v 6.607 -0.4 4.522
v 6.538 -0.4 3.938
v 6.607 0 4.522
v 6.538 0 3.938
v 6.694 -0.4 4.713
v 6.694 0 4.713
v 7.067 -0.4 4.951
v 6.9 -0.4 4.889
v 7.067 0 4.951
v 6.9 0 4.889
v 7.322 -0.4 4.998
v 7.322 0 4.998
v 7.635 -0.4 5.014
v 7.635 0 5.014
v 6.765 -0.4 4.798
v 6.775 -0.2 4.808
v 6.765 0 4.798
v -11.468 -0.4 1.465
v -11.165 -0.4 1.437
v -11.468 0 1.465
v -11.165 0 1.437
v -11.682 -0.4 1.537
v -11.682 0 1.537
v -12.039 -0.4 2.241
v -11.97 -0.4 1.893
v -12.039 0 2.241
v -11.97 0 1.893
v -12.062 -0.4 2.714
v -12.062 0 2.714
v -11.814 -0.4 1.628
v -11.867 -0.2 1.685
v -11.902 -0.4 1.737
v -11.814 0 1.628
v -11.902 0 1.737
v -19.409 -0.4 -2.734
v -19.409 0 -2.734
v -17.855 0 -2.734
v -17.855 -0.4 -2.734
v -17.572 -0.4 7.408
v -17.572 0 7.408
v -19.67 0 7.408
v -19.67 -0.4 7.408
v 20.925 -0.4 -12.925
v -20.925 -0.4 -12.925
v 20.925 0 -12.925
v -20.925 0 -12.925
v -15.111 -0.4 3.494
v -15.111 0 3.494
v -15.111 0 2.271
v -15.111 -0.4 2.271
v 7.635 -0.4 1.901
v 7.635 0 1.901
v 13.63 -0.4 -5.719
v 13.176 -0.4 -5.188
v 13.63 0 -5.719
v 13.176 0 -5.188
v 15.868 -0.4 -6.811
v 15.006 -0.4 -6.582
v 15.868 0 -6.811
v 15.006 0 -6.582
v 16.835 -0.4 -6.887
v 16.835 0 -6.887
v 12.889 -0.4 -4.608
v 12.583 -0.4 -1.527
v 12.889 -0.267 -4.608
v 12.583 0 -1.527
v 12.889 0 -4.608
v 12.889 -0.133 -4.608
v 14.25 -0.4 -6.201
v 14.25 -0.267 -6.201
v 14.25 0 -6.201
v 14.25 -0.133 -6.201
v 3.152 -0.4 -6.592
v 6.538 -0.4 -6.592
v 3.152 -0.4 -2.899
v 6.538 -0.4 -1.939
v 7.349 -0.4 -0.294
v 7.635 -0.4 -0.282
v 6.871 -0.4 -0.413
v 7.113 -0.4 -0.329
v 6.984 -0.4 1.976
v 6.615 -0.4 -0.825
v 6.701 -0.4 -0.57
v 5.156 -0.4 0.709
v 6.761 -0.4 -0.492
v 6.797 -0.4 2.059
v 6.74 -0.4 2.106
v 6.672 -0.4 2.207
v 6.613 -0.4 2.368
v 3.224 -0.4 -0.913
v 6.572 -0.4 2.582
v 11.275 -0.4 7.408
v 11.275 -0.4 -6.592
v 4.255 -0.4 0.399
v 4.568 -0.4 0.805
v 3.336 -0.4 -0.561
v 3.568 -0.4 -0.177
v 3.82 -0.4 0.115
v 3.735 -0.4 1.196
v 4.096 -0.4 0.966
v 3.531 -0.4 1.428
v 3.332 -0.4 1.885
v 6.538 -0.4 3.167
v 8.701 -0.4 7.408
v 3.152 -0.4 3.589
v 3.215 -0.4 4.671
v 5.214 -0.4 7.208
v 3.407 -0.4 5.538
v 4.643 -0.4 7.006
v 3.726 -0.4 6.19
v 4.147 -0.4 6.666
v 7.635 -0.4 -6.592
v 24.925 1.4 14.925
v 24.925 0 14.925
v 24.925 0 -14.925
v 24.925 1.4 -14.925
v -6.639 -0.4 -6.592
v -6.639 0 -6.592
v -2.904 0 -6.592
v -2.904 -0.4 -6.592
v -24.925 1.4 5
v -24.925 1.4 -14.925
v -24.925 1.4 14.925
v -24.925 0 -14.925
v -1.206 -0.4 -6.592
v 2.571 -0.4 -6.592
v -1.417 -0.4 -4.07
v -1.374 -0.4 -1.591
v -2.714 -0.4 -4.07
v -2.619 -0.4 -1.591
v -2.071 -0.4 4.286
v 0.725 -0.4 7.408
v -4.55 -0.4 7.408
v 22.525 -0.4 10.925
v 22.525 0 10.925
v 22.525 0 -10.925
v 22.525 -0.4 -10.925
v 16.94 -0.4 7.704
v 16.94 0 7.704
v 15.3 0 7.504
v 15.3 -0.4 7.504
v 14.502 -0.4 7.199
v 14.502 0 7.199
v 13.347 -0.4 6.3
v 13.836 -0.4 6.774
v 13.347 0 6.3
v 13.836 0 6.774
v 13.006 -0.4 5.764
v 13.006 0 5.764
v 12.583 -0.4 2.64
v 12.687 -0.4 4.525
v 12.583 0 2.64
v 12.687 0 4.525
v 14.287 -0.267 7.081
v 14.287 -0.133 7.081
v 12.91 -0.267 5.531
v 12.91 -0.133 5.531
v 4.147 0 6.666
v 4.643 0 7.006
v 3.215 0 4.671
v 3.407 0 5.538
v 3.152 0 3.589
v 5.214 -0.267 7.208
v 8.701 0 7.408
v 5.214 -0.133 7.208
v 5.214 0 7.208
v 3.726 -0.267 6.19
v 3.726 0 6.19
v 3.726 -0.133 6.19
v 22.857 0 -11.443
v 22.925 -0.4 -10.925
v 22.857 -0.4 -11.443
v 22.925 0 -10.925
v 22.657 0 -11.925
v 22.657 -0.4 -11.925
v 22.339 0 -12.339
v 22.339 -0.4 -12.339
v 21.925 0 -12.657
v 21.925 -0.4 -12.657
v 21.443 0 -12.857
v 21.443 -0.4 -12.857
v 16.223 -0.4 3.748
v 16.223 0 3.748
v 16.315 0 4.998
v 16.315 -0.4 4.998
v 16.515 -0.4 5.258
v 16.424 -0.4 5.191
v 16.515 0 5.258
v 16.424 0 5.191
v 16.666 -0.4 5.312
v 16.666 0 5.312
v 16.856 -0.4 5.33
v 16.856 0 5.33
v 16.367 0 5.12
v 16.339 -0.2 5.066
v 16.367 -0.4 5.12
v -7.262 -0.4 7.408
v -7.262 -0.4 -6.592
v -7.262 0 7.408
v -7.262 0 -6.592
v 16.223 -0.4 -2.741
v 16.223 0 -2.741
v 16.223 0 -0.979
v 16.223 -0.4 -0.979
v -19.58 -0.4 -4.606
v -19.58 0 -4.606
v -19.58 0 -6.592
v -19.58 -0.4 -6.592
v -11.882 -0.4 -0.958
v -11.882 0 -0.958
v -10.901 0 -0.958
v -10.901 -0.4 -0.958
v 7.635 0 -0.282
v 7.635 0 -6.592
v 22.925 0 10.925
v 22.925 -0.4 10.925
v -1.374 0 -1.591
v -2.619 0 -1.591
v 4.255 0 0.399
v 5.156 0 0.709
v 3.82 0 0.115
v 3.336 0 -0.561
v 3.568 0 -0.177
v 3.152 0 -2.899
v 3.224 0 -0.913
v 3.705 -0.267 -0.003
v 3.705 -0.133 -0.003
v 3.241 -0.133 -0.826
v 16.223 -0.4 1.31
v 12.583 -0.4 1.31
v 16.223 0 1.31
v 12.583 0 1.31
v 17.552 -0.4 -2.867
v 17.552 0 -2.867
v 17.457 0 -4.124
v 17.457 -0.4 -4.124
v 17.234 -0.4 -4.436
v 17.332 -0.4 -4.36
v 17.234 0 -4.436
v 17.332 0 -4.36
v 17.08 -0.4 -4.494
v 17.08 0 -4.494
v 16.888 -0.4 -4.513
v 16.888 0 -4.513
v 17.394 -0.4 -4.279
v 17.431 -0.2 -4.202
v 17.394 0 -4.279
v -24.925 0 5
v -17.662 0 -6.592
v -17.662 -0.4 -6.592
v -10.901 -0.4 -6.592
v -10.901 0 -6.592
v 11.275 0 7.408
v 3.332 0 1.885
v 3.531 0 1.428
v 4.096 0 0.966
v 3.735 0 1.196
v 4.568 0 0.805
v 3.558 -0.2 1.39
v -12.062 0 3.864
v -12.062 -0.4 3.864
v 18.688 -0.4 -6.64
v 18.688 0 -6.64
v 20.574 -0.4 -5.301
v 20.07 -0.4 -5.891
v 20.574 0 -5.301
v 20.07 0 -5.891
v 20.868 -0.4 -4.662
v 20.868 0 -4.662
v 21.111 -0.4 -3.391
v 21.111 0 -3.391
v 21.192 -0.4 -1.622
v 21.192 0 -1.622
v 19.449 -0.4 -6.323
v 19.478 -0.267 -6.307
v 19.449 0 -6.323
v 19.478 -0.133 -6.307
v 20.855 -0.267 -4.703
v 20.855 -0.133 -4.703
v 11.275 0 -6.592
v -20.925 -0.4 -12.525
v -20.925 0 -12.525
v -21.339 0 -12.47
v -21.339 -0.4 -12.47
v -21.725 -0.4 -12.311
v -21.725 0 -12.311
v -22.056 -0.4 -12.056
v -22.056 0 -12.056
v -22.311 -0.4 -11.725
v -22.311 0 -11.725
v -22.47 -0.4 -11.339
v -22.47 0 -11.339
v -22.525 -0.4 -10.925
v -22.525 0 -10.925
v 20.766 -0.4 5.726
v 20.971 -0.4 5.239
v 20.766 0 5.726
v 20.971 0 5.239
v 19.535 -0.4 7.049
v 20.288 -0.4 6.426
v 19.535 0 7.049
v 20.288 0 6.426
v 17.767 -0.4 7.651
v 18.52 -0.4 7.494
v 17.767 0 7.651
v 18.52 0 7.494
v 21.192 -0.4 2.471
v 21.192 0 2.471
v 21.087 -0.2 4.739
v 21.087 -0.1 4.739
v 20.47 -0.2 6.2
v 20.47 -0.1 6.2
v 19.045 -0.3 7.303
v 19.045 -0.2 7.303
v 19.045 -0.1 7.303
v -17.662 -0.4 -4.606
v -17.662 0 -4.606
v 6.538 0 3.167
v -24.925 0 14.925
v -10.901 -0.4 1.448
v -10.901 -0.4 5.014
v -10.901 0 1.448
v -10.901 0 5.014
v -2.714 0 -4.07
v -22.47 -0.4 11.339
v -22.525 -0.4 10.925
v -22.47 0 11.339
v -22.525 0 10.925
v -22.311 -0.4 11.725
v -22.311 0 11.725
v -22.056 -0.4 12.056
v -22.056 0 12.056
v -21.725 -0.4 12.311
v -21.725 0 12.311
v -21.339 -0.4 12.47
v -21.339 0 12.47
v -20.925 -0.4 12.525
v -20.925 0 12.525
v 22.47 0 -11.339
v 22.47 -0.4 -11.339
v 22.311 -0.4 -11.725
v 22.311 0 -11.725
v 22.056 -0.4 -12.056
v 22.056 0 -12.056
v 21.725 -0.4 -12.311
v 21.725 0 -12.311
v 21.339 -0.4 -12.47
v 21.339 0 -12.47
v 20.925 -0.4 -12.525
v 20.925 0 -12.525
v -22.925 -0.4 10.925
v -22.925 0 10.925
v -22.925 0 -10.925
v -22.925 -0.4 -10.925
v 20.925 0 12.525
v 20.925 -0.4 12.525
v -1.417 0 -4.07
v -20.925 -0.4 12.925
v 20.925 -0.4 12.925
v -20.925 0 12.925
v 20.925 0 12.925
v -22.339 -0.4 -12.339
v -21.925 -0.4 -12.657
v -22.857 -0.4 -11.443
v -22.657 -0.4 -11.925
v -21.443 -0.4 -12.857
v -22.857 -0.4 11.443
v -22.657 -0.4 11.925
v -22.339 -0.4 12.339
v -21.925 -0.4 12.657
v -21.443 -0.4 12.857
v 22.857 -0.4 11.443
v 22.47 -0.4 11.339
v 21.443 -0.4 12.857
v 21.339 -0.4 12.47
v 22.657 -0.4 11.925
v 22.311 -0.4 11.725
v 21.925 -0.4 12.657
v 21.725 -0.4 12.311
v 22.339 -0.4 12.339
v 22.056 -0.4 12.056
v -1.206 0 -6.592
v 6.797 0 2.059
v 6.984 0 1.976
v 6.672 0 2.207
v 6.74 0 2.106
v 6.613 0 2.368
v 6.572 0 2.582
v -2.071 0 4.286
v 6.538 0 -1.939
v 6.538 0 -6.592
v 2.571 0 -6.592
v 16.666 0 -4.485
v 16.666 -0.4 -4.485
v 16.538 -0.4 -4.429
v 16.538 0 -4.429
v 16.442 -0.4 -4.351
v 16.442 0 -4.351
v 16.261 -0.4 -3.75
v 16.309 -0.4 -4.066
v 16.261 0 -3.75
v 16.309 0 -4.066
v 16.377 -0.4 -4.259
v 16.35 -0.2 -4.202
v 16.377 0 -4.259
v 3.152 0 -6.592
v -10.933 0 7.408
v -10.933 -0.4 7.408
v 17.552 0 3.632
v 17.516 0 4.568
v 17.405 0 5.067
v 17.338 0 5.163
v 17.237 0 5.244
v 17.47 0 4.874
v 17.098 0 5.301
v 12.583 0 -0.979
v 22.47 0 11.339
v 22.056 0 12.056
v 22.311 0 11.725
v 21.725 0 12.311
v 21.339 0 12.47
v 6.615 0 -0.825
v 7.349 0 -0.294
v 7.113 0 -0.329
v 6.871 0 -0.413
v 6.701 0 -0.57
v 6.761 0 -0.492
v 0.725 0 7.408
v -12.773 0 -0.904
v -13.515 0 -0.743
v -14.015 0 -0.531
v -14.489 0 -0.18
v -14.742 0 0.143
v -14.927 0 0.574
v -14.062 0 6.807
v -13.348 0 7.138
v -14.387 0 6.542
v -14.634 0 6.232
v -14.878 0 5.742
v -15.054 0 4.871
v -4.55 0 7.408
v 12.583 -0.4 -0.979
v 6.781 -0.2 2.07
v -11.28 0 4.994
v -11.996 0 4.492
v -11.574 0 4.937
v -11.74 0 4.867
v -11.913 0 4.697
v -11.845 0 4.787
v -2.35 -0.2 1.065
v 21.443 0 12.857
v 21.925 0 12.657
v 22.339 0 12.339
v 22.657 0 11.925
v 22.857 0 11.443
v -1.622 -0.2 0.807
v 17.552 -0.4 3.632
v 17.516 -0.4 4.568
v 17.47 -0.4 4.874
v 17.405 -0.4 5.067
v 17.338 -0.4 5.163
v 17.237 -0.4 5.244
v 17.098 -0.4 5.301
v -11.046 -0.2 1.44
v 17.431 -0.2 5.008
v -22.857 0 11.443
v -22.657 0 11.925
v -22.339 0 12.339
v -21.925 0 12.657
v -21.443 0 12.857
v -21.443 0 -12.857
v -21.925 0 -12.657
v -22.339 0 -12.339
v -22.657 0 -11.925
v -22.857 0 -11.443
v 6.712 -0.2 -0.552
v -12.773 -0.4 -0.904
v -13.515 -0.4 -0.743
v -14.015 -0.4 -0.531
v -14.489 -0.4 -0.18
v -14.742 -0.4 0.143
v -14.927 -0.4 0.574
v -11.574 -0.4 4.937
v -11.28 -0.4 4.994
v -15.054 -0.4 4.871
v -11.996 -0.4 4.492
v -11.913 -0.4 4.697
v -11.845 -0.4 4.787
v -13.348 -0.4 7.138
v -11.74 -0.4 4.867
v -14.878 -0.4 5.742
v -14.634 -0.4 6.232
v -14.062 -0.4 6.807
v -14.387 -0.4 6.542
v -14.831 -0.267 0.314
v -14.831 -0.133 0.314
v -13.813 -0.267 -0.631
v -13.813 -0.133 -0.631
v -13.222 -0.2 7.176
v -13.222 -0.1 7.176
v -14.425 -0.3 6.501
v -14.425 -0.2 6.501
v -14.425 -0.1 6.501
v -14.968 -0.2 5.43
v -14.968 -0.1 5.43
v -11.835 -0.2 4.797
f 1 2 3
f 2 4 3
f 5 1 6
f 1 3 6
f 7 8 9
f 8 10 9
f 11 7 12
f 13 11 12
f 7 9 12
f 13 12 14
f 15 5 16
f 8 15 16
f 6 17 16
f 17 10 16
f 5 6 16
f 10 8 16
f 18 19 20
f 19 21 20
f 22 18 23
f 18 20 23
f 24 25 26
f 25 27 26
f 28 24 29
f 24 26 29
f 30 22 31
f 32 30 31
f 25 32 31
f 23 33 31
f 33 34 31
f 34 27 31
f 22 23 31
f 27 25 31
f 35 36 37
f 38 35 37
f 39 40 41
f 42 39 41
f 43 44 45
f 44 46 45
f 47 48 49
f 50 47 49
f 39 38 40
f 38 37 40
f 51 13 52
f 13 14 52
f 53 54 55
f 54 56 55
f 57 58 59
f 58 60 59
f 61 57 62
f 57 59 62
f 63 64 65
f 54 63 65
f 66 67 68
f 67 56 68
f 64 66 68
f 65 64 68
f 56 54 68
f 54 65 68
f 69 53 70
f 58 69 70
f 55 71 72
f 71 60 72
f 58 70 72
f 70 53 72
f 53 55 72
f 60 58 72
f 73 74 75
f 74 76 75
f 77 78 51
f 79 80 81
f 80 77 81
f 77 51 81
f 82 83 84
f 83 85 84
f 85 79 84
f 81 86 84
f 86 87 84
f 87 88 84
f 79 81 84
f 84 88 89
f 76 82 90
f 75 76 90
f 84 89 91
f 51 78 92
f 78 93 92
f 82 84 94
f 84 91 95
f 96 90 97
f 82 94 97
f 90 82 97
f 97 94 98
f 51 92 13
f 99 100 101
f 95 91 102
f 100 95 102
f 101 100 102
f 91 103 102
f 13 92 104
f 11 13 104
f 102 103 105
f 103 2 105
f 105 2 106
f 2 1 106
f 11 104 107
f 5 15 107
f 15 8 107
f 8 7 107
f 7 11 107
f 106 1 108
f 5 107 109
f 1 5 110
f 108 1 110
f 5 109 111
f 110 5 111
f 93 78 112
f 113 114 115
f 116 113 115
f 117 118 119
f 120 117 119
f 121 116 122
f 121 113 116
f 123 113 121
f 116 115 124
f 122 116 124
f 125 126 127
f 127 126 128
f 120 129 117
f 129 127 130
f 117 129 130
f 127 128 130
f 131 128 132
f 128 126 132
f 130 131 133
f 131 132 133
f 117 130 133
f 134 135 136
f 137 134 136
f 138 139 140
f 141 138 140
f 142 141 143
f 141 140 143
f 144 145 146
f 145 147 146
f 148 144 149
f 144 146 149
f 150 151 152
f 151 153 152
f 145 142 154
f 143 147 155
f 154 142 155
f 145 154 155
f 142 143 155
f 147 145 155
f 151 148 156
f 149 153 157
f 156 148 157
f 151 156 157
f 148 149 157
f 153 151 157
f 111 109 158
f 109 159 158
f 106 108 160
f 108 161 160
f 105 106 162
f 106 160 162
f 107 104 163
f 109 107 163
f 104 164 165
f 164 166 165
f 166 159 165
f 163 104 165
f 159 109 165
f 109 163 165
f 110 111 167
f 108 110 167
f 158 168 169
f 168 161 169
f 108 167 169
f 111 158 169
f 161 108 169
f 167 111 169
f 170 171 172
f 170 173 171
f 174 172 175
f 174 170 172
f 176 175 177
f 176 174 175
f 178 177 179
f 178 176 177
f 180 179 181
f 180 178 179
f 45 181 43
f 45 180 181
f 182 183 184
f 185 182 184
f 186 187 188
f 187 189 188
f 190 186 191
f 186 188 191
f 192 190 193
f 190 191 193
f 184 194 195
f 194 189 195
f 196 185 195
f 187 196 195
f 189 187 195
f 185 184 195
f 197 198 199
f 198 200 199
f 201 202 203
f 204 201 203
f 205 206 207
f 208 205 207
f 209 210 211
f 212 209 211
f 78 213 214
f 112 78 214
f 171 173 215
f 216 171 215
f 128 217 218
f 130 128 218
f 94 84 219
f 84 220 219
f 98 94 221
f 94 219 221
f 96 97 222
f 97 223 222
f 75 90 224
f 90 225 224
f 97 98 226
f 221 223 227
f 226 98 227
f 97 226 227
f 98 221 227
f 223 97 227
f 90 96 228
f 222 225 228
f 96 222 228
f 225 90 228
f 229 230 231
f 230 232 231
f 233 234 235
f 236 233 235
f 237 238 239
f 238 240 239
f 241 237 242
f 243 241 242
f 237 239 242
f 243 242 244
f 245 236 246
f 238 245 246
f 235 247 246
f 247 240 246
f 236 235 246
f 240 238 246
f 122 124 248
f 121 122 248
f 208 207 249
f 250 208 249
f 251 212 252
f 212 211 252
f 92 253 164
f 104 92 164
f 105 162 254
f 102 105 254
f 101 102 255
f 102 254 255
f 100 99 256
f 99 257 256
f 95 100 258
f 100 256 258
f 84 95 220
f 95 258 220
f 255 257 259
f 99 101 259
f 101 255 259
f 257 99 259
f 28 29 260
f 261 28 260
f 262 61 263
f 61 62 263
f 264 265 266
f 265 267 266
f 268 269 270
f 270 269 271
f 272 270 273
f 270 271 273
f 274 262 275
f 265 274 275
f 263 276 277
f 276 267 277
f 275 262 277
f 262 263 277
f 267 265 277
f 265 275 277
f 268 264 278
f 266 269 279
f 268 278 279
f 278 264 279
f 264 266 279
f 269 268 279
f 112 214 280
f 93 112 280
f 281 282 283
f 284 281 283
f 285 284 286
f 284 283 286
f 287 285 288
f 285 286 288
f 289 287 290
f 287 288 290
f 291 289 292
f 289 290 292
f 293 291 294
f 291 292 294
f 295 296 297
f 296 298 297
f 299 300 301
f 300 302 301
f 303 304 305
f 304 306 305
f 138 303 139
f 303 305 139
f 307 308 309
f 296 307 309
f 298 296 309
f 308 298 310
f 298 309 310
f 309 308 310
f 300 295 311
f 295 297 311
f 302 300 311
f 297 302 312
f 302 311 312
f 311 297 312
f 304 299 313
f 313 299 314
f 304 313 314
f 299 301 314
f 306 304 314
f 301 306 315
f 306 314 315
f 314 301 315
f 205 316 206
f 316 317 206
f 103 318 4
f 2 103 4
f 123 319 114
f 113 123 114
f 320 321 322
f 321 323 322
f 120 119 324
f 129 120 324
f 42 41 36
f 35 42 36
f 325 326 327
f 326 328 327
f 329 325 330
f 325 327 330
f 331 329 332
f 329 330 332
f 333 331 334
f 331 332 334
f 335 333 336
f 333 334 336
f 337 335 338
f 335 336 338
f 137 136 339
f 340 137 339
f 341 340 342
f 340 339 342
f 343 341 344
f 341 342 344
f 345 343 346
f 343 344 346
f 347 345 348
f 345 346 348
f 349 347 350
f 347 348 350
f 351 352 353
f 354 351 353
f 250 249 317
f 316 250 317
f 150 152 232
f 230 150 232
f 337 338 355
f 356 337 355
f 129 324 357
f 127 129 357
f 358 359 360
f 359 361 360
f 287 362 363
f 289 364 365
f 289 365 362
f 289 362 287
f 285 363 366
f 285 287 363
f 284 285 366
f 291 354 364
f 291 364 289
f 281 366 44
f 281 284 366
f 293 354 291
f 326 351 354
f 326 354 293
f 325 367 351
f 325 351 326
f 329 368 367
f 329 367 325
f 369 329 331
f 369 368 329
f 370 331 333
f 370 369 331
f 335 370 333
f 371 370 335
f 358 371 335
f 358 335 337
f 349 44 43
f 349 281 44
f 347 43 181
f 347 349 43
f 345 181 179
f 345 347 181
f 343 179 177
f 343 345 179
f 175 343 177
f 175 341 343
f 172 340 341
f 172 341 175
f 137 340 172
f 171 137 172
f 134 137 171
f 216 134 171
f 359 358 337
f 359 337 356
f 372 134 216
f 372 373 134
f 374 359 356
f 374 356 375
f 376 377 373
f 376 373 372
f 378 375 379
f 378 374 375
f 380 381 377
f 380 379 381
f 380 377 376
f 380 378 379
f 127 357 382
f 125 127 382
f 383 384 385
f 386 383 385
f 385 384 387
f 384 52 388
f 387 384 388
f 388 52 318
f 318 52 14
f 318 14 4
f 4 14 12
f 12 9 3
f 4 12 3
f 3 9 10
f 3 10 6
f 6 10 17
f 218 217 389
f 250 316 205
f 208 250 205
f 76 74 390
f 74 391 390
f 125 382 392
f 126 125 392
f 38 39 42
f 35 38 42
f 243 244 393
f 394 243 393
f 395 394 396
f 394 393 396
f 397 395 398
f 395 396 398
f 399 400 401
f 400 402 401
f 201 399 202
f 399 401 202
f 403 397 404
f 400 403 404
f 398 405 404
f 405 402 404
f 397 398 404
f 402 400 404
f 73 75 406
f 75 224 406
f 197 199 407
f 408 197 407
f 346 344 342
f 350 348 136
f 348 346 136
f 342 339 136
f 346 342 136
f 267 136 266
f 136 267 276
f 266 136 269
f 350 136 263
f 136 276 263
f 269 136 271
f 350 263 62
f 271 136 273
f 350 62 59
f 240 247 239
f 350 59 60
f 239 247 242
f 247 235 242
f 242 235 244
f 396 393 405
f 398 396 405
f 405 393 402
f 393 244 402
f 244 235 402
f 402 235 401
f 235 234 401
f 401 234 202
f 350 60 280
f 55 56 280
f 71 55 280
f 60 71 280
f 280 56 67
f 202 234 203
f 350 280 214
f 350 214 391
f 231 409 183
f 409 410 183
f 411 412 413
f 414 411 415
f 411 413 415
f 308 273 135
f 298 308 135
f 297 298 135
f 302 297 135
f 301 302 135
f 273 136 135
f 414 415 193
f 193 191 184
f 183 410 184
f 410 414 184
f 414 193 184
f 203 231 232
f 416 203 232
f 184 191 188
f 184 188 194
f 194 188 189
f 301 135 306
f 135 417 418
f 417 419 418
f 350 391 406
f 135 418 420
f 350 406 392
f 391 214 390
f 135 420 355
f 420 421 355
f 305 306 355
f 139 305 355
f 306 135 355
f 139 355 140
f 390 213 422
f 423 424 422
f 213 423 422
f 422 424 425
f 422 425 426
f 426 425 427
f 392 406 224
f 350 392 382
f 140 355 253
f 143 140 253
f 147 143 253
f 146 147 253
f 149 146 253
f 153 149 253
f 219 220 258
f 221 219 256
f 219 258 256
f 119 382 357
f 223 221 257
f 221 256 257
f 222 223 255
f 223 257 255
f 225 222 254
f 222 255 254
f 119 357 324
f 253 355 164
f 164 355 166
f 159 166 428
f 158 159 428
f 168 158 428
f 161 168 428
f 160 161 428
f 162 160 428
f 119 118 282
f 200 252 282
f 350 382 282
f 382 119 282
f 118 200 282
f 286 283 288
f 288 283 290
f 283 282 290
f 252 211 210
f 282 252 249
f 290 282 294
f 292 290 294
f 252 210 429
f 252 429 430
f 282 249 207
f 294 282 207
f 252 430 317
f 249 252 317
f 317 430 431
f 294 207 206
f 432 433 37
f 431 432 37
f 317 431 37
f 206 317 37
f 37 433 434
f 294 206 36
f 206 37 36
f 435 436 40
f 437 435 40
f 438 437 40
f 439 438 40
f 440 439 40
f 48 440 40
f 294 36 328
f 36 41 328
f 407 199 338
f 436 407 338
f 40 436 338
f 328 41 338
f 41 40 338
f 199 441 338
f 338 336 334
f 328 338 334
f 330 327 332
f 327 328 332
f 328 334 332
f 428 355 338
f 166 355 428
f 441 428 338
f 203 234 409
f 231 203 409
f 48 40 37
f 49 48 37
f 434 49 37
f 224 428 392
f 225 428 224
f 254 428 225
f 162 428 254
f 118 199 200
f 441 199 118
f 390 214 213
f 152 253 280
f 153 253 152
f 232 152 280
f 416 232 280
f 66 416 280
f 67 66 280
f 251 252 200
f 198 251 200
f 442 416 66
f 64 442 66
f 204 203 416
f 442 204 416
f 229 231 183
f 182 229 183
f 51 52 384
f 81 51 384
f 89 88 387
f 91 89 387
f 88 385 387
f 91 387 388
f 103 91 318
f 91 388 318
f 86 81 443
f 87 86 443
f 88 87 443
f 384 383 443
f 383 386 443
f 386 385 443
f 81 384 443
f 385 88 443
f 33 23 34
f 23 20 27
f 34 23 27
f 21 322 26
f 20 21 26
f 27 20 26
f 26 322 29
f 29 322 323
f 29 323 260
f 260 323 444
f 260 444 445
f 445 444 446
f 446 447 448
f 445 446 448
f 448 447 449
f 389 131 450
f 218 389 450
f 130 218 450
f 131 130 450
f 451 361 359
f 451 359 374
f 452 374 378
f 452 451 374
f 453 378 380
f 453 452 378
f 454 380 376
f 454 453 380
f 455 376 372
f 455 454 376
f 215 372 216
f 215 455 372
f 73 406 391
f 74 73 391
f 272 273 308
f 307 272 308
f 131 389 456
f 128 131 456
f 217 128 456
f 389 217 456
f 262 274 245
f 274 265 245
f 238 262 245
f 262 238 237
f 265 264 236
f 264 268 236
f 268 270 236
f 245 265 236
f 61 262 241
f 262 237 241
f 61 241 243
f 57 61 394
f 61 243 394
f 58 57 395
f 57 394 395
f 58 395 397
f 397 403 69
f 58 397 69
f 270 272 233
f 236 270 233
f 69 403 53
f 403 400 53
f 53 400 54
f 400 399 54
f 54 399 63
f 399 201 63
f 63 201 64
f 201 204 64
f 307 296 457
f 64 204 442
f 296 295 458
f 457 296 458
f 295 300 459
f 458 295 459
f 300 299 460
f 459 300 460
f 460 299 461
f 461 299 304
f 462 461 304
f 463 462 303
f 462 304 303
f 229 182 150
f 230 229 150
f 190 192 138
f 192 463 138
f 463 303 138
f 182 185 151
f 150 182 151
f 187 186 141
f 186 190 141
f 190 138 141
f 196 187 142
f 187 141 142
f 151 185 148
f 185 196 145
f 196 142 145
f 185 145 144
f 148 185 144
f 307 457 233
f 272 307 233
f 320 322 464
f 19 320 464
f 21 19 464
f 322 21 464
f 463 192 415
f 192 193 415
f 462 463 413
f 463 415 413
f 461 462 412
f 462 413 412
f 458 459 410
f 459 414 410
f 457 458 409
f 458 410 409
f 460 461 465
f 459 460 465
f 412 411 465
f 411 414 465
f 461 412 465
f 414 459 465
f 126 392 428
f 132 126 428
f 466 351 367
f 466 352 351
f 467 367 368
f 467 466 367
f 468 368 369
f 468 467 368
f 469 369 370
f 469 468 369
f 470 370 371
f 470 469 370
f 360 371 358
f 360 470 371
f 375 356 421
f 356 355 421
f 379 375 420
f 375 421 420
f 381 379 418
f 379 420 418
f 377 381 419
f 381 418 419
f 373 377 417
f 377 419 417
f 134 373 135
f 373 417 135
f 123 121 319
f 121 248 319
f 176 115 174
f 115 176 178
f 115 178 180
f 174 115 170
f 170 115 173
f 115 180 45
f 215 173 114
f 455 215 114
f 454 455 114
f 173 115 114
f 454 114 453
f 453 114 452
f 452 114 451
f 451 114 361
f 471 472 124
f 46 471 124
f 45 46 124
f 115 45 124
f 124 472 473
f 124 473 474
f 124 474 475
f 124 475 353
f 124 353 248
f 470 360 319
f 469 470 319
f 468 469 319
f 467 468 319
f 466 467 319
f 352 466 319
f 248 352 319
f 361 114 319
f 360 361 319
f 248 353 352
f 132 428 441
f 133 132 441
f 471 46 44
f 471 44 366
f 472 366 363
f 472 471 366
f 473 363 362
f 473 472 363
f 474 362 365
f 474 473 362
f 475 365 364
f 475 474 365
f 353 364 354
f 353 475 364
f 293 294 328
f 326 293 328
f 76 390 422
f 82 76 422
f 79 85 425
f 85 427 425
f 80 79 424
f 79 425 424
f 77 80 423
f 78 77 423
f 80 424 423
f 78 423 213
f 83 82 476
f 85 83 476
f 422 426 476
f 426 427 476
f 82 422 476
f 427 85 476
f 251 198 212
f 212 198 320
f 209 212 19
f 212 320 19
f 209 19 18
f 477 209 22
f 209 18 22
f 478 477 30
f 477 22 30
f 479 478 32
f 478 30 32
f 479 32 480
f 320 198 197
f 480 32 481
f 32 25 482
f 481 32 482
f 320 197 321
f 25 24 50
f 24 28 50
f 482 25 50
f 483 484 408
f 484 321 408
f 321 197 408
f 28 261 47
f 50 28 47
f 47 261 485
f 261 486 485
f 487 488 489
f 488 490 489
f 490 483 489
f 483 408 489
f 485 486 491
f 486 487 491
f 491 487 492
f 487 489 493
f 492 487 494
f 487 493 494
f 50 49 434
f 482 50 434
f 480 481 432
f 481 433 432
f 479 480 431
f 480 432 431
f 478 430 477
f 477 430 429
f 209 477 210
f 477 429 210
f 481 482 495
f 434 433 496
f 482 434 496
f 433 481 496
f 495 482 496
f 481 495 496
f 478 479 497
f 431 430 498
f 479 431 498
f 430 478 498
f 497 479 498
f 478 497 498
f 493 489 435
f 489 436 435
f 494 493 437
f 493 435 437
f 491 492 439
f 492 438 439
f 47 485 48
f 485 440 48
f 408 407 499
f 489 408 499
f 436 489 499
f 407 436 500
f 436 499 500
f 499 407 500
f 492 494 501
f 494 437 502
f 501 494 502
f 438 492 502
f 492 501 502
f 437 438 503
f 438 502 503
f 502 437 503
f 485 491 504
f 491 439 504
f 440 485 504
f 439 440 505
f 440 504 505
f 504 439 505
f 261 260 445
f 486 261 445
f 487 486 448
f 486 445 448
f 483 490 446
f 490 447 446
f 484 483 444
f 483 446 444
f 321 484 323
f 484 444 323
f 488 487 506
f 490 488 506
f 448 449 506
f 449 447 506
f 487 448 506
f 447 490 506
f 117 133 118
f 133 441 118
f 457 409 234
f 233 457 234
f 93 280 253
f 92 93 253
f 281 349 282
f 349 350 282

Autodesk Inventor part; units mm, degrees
ref_plane "YZ Plane" through (0, 0, 0) normal (1, 0, 0) x (0, 1, 0)
ref_plane "XZ Plane" through (0, 0, 0) normal (0, 1, 0) x (-1, 0, 0)
ref_plane "XY Plane" through (0, 0, 0) normal (0, 0, 1) x (1, 0, 0)
sketch "Sketch1" plane through (0, 0, 0) normal (0, 1, 0) x (-1, 0, 0)
  line L0 (24.925, 14.925) -> (-24.925, 14.925)
  line L1 (-24.925, 14.925) -> (-24.925, -14.925)
  line L2 (-24.925, -14.925) -> (24.925, -14.925)
  line L3 (24.925, 14.925) -> (-24.925, -14.925) construction
  line L4 (-24.925, 14.925) -> (24.925, -14.925) construction
  line L5 (24.925, -14.925) -> (24.925, 14.925)
  line L6 (24.925, 5) -> (24.925, 14.925)
  point P0 (0, 0)
  dimension "d0" = 49.85
  dimension "d1" = 29.85
extrude "Extrusion1" add sketch "Sketch1" along normal blind 1.4
sketch "Sketch2" plane through (0, 0, 0) normal (0, -1, 0) x (1, 0, 0)
  point P0 (0, 0)
sketch "Sketch3" plane through (-24.925, 0, -14.925) normal (-1, 0, 0) x (0, 0, 1)
  point P0 (14.925, 0)
ref_plane "Work Plane1" through (0, 0, 0) normal (0, 1, 0) x (-1, 0, 0)
sketch "Sketch5" plane through (0, 0, 0) normal (0, 1, 0) x (-1, 0, 0)
  line L0 (-24.925, 14.925) -> (24.925, 14.925) projected
  line L1 (24.925, -14.925) -> (-24.925, -14.925) projected
  line L2 (24.925, 14.925) -> (24.925, -14.925) projected
  line L3 (-19.3821, 7.7039) -> (19.3821, 7.7039) construction
  line L4 (19.3821, 7.7039) -> (19.3821, -7.7039) construction
  line L5 (19.3821, -7.7039) -> (-19.3821, -7.7039) construction
  line L6 (-19.3821, -7.7039) -> (-19.3821, 7.7039) construction
  line L7 (-24.925, -14.925) -> (-24.925, 14.925) projected
  line L8 (-12.5833, 1.3105) -> (-16.2231, 1.3105)
  line L9 (-16.2231, 1.3105) -> (-16.2231, 3.7476)
  spline S0 degree 2 poles (-16.2231, 3.7476) (-16.2231, 4.8026) (-16.4552, 5.3301) (-16.8561, 5.3301) knots 0 0 0 1 2 2 2
  spline S1 degree 2 poles (-16.8561, 5.3301) (-17.3097, 5.3301) (-17.5524, 4.6866) (-17.5524, 3.6316) knots 0 0 0 1 2 2 2
  line L10 (-17.5524, 3.6316) -> (-17.5524, -2.8673)
  spline S2 degree 2 poles (-17.5524, -2.8673) (-17.5524, -3.8907) (-17.3097, -4.5131) (-16.8877, -4.5131) knots 0 0 0 1 2 2 2
  spline S3 degree 2 poles (-16.8877, -4.5131) (-16.4763, -4.5131) (-16.2231, -3.8907) (-16.2231, -2.7407) knots 0 0 0 1 2 2 2
  line L11 (-16.2231, -2.7407) -> (-16.2231, -0.9788)
  line L12 (-16.2231, -0.9788) -> (-12.5833, -0.9788)
  line L13 (-12.5833, -0.9788) -> (-12.5833, -1.5274)
  spline S4 degree 2 poles (-12.5833, -1.5274) (-12.5833, -3.7008) (-13.1952, -5.5154) (-15.3052, -6.8869) (-16.835, -6.8869) knots 0 0 0 1 2 3 3 3
  spline S5 degree 2 poles (-16.835, -6.8869) (-18.4386, -6.8869) (-20.517, -5.7264) (-21.1922, -3.6797) (-21.1922, -1.6224) knots 0 0 0 1 2 3 3 3
  line L14 (-21.1922, -1.6224) -> (-21.1922, 2.4711)
  spline S6 degree 2 poles (-21.1922, 2.4711) (-21.1922, 3.9797) (-20.9812, 5.4989) (-19.9578, 6.9021) (-18.1326, 7.7039) (-16.9405, 7.7039) knots 0 0 0 1 2 3 4 4 4
  spline S7 degree 2 poles (-16.9405, 7.7039) (-15.3369, 7.7039) (-13.2374, 6.459) (-12.5833, 4.6022) (-12.5833, 2.6399) knots 0 0 0 1 2 3 3 3
  line L15 (-12.5833, 2.6399) -> (-12.5833, 1.3105)
  line L16 (-11.2751, 7.4085) -> (-8.7008, 7.4085)
  spline S8 degree 2 poles (-8.7008, 7.4085) (-6.1266, 7.4085) (-4.3014, 7.0076) (-3.1515, 5.3723) (-3.1515, 3.5894) knots 0 0 0 1 2 3 3 3
  spline S9 degree 2 poles (-3.1515, 3.5894) (-3.1515, 1.9541) (-3.9638, 0.8252) (-5.156, 0.7092) knots 0 0 0 1 2 2 2
  spline S10 degree 2 poles (-5.156, 0.7092) (-4.0799, 0.4454) (-3.3308, -0.4513) (-3.1515, -1.2004) (-3.1515, -2.899) knots 0 0 0 1 2 3 3 3
  line L17 (-3.1515, -2.899) -> (-3.1515, -6.5915)
  line L18 (-3.1515, -6.5915) -> (-6.5381, -6.5915)
  line L19 (-6.5381, -6.5915) -> (-6.5381, -1.9389)
  spline S11 degree 2 poles (-6.5381, -1.9389) (-6.5381, -0.8206) (-6.8862, -0.2825) (-7.6353, -0.2825) knots 0 0 0 1 2 2 2
  line L20 (-7.6353, -0.2825) -> (-7.6353, -6.5915)
  line L21 (-7.6353, -6.5915) -> (-11.2751, -6.5915)
  line L22 (-11.2751, -6.5915) -> (-11.2751, 7.4085)
  line L23 (-7.6353, 5.0136) -> (-7.6353, 1.9013)
  spline S12 degree 2 poles (-7.6353, 1.9013) (-7.0234, 1.9013) (-6.5381, 2.239) (-6.5381, 3.1674) knots 0 0 0 1 2 2 2
  line L24 (-6.5381, 3.1674) -> (-6.5381, 3.9375)
  spline S13 degree 2 poles (-6.5381, 3.9375) (-6.5381, 4.6022) (-7.0128, 5.0136) (-7.6353, 5.0136) knots 0 0 0 1 2 2 2
  line L25 (4.5501, 7.4085) -> (6.639, -6.5915)
  line L26 (6.639, -6.5915) -> (2.9043, -6.5915)
  line L27 (2.9043, -6.5915) -> (2.7144, -4.07)
  line L28 (2.7144, -4.07) -> (1.4167, -4.07)
  line L29 (1.4167, -4.07) -> (1.2057, -6.5915)
  line L30 (1.2057, -6.5915) -> (-2.5712, -6.5915)
  line L31 (-2.5712, -6.5915) -> (-0.725, 7.4085)
  line L32 (-0.725, 7.4085) -> (4.5501, 7.4085)
  spline S14 degree 2 poles (2.6194, -1.5907) (2.3557, 0.783) (2.0708, 4.2857) knots 0 0 0 1 1 1
  spline S15 degree 2 poles (2.0708, 4.2857) (1.5222, 0.2661) (1.3745, -1.5907) knots 0 0 0 1 1 1
  line L33 (1.3745, -1.5907) -> (2.6194, -1.5907)
  line L34 (7.2615, 7.4085) -> (10.9329, 7.4085)
  spline S16 degree 2 poles (10.9329, 7.4085) (12.4205, 7.4085) (14.0241, 6.9443) (14.8259, 6.0581) (15.1108, 4.8026) (15.1108, 3.4944) knots 0 0 0 1 2 3 4 4 4
  line L35 (15.1108, 3.4944) -> (15.1108, 2.2706)
  spline S17 degree 2 poles (15.1108, 2.2706) (15.1108, 0.9307) (14.5516, -0.3036) (13.0746, -0.9577) (11.8824, -0.9577) knots 0 0 0 1 2 3 3 3
  line L36 (11.8824, -0.9577) -> (10.9013, -0.9577)
  line L37 (10.9013, -0.9577) -> (10.9013, -6.5915)
  line L38 (10.9013, -6.5915) -> (7.2615, -6.5915)
  line L39 (7.2615, -6.5915) -> (7.2615, 7.4085)
  line L40 (10.9013, 5.0136) -> (10.9013, 1.4477)
  spline S18 degree 2 poles (10.9013, 1.4477) (11.0595, 1.4371) (11.165, 1.4371) knots 0 0 0 1 1 1
  spline S19 degree 2 poles (11.165, 1.4371) (11.6714, 1.4371) (12.0618, 1.933) (12.0618, 2.7137) knots 0 0 0 1 2 2 2
  line L41 (12.0618, 2.7137) -> (12.0618, 3.8637)
  spline S20 degree 2 poles (12.0618, 3.8637) (12.0618, 4.5811) (11.6081, 5.0136) (10.9013, 5.0136) knots 0 0 0 1 2 2 2
  line L42 (19.6704, 7.4085) -> (19.4094, -2.7341)
  line L43 (19.4094, -2.7341) -> (17.8551, -2.7341)
  line L44 (17.8551, -2.7341) -> (17.5715, 7.4085)
  line L45 (17.5715, 7.4085) -> (19.6704, 7.4085)
  line L46 (19.5796, -6.5915) -> (17.6623, -6.5915)
  line L47 (17.6623, -6.5915) -> (17.6623, -4.6061)
  line L48 (17.6623, -4.6061) -> (19.5796, -4.6061)
  line L49 (19.5796, -4.6061) -> (19.5796, -6.5915)
  point P0 (0, 0)
  dimension "d13" = 29.85
  dimension "d14" = 49.85
  dimension "d16" = 38.7641
  dimension "d17" = 15.4078
  dimension "d18" = 7.2211
  dimension "d22" = 5.5429
extrude "Extrusion4" add sketch "Sketch5" against normal blind 0.4 contours L8 L9 S0 S1 L10 S2 S3 L11 L12 L13 S4 S5 L14 S6 S7 L15 | L16 S8 S9 S10 L17 L18 L19 S11 L20 L21 L22 | L25 L26 L27 L28 L29 L30 L31 L32 | L34 S16 L35 S17 L36 L37 L38 L39 | L42 L43 L44 L45 | L46 L47 L48 L49
sketch "Sketch6" plane through (0, 0, 0) normal (0, -1, 0) x (1, 0, 0)
  line L0 (-24.925, 14.925) -> (-24.925, -14.925) projected
  line L1 (24.925, 14.925) -> (-24.925, 14.925) projected
  line L2 (24.925, -14.925) -> (24.925, 14.925) projected
  line L3 (-24.925, -14.925) -> (24.925, -14.925) projected
  line L4 (-22.925, 10.925) -> (-22.925, -10.925)
  line L5 (-20.925, -12.925) -> (20.925, -12.925)
  line L6 (22.925, -10.925) -> (22.925, 10.925)
  line L7 (20.925, 12.925) -> (-20.925, 12.925)
  arc A0 (-20.925, 12.925) -> (-22.925, 10.925) centre (-20.925, 10.925) ccw
  arc A1 (-22.925, -10.925) -> (-20.925, -12.925) centre (-20.925, -10.925) ccw
  arc A2 (20.925, -12.925) -> (22.925, -10.925) centre (20.925, -10.925) ccw
  arc A3 (22.925, 10.925) -> (20.925, 12.925) centre (20.925, 10.925) ccw
  line L8 (-20.925, 12.525) -> (20.925, 12.525)
  arc A4 (22.525, 10.925) -> (20.925, 12.525) centre (20.925, 10.925) ccw
  line L9 (22.525, 10.925) -> (22.525, -10.925)
  arc A5 (20.925, -12.525) -> (22.525, -10.925) centre (20.925, -10.925) ccw
  line L10 (20.925, -12.525) -> (-20.925, -12.525)
  arc A6 (-22.525, -10.925) -> (-20.925, -12.525) centre (-20.925, -10.925) ccw
  line L11 (-22.525, -10.925) -> (-22.525, 10.925)
  arc A7 (-20.925, 12.525) -> (-22.525, 10.925) centre (-20.925, 10.925) ccw
  point P0 (0, 0)
  dimension "d23" = 2
  dimension "d24" = 2
  dimension "d25" = 0.4
extrude "Extrusion5" add sketch "Sketch6" along normal blind 0.4 contours A0 L7 A3 L6 A2 L5 A1 L4
equation "\"d18\" = 0.5 * d13 - 0.5 * d17"
equation "\"d22\" = 0.5 * d14 - 0.5 * d16"
properties part number "stamp5x3" material "PET Plastic"
